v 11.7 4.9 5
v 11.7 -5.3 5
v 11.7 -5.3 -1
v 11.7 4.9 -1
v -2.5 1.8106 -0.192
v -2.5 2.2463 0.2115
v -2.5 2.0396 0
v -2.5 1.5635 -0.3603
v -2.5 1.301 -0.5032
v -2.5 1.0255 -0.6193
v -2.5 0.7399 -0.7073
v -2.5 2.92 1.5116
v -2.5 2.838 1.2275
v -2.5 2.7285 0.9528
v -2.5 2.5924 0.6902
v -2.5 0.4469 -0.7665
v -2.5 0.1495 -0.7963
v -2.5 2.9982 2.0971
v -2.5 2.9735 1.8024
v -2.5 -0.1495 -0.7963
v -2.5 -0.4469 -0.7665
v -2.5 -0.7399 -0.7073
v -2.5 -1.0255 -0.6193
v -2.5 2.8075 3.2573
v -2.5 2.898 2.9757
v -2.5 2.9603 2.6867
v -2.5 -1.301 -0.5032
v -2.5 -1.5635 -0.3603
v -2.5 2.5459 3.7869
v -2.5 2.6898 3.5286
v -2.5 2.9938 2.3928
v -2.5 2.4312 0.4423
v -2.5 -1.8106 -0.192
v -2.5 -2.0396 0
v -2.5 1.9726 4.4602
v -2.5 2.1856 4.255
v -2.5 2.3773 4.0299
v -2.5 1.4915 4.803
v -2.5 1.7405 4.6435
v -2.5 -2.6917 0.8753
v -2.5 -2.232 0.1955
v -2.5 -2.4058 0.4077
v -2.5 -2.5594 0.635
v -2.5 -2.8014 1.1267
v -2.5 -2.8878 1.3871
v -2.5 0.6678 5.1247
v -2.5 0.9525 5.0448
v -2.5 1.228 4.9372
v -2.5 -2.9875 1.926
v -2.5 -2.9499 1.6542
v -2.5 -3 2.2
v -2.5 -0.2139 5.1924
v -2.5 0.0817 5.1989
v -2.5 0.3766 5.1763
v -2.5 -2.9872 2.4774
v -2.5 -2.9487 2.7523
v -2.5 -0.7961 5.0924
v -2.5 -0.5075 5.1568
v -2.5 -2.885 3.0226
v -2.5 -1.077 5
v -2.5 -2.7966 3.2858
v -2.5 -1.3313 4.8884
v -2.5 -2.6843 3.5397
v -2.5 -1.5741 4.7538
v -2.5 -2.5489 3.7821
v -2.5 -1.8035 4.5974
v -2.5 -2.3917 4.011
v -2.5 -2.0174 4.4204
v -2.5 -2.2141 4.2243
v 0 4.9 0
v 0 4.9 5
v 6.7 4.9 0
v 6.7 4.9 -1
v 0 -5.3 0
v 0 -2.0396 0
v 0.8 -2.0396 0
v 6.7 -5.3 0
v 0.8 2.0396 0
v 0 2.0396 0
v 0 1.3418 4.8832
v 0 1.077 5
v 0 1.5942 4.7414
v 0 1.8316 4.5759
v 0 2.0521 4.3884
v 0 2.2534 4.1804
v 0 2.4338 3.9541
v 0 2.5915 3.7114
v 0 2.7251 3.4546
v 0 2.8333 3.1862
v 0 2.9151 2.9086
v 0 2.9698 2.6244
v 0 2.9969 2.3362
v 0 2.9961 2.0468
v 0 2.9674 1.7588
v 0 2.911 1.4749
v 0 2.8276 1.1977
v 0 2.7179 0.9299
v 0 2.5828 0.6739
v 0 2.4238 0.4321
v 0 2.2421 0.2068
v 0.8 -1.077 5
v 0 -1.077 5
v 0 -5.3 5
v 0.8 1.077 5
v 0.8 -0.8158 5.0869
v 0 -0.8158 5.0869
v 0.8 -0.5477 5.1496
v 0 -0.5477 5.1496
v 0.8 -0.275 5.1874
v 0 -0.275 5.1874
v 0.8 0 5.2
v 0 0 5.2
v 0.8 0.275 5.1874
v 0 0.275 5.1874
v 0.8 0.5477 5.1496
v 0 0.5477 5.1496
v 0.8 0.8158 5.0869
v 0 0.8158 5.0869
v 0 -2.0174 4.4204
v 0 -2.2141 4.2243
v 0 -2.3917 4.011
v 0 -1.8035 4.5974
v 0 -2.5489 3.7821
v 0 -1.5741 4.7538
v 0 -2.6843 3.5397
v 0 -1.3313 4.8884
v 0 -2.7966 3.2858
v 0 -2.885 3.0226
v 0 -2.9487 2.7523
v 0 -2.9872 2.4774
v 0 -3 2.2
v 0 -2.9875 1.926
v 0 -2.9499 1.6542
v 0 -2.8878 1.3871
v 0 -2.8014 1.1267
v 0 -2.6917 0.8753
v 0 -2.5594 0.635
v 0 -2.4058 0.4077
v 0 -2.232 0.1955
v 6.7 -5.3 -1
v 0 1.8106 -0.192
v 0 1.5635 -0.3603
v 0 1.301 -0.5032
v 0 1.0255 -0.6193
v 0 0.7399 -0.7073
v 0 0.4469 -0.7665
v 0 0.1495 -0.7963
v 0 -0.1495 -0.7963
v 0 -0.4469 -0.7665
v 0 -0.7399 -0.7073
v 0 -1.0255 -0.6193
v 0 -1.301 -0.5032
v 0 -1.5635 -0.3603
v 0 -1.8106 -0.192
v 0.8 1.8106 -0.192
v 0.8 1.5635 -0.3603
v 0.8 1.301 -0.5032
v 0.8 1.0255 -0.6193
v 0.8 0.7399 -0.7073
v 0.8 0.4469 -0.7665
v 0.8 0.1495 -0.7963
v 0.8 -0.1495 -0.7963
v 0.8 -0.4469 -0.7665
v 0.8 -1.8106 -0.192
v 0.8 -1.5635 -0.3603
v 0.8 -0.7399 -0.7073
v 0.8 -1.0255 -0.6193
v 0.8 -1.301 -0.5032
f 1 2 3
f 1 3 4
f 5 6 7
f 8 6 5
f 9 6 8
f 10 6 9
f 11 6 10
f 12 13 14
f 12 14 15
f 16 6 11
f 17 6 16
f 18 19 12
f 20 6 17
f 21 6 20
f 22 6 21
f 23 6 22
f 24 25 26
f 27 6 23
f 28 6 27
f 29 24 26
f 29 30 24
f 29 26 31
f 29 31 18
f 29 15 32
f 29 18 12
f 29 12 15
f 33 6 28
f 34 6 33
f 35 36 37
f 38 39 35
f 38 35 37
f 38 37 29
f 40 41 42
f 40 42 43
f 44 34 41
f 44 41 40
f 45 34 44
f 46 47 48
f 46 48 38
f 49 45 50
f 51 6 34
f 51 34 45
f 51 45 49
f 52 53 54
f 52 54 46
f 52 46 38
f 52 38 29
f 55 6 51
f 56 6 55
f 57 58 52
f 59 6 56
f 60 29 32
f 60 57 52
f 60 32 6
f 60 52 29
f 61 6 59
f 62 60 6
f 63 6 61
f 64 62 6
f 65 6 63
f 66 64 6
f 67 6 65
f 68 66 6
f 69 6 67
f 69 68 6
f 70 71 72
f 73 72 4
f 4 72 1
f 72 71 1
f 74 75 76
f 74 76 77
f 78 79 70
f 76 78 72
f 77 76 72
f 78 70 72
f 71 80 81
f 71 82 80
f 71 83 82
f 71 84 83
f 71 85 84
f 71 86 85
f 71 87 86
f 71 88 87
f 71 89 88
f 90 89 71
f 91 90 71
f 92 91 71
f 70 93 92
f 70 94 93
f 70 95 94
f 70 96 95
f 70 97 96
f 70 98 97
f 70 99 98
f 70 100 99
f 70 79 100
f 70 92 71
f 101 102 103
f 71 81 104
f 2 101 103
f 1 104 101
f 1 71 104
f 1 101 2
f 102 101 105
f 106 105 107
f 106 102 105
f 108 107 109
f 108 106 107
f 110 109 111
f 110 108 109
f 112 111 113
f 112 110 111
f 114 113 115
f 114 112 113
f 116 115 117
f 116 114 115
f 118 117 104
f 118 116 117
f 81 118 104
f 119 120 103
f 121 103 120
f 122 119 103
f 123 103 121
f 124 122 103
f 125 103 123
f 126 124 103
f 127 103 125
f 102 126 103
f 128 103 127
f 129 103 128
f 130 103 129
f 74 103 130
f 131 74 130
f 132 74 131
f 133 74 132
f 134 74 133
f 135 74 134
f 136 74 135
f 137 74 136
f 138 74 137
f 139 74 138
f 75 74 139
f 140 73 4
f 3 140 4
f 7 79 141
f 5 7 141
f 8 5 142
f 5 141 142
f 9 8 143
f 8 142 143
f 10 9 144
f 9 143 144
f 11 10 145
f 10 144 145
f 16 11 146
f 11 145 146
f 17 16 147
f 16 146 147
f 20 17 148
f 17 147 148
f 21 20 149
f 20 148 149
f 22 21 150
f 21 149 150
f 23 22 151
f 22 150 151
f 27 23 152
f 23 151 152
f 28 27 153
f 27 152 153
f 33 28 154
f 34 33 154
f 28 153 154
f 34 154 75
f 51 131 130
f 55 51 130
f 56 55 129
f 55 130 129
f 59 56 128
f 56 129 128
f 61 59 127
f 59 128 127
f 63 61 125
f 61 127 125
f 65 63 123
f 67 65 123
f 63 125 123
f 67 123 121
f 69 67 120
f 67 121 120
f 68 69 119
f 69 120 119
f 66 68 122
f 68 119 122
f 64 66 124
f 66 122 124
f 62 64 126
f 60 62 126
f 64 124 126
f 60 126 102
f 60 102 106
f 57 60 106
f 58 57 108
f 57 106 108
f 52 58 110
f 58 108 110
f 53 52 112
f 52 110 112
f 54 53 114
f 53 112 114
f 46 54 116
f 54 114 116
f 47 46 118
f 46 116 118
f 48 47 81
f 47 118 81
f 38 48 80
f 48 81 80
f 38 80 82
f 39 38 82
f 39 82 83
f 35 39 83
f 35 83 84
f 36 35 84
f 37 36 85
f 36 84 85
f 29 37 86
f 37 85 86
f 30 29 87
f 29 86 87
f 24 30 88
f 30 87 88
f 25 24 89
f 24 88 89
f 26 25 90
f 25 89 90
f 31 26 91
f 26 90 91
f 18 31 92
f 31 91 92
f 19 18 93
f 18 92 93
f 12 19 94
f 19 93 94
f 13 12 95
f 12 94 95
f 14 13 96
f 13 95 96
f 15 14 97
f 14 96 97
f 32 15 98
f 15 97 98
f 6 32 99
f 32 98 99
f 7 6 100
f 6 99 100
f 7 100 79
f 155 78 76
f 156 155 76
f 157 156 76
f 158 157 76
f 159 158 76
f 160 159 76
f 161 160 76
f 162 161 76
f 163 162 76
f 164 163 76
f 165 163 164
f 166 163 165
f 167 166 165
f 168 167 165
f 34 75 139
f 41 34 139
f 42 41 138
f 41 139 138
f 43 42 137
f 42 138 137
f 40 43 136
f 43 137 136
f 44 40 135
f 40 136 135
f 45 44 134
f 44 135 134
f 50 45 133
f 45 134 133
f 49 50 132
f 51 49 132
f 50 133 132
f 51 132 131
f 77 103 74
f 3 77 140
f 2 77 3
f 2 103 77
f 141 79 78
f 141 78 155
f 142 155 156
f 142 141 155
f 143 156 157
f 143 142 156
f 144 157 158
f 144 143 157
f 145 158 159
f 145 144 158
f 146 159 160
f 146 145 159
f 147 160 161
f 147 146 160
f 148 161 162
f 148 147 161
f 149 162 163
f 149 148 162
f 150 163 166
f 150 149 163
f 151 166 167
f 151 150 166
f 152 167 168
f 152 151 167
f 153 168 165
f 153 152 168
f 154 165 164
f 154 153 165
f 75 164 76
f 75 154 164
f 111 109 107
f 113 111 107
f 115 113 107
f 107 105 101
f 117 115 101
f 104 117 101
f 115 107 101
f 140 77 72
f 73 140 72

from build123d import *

# Parameters (mm, degrees)
F0_W          = 5
F0_H          = 10.2
F0_W_2        = 6.7
F1_DEPTH      = 5
F2_DEPTH      = 1
F4_DEPTH      = 2.5
F4_DEPTH_BACK = 0.8


with BuildPart() as f1:
    # F0 (on Top) → F1 (new body)
    with BuildSketch(Plane.XY):
        with Locations((9.2, -0.2)):
            Rectangle(F0_W, F0_H)
        with Locations((3.35, -0.2)):
            Rectangle(F0_W_2, F0_H)
    extrude(amount=F1_DEPTH)

    # F0 (on Top) → F2 (join)
    with BuildSketch(Plane.XY):
        with Locations((9.2, -0.2)):
            Rectangle(F0_W, F0_H)
    extrude(amount=-F2_DEPTH)

    # F3 (on face) → F4 (join, two sides)
    with BuildSketch(Plane(origin=(0, 0, 0), x_dir=(0, -1, 0), z_dir=(-1, 0, 0))) as f4_sk:
        with BuildLine():
            ThreePointArc((2.0396078054, 0), (2.7494384351, 0.9997549034), (3, 2.2))
            ThreePointArc((3, 2.2), (2.4729636961, 3.8983670268), (1.0770329614, 5))
            Line((1.0770329614, 5), (-1.0770329614, 5))
            ThreePointArc((-1.0770329614, 5), (-2.9459060435, 2.7671310101), (-2.0396078054, 0))
            Line((-2.0396078054, 0), (2.0396078054, 0))
        make_face()
        with BuildLine():
            Line((-1.0770329614, 5), (1.0770329614, 5))
            ThreePointArc((1.0770329614, 5), (0, 5.2), (-1.0770329614, 5))
        make_face()
        with BuildLine():
            ThreePointArc((-2.0396078054, 0), (0, -0.8), (2.0396078054, 0))
            Line((2.0396078054, 0), (-2.0396078054, 0))
        make_face()
    extrude(amount=F4_DEPTH)
    extrude(f4_sk.sketch, amount=-F4_DEPTH_BACK)


solid = f1.part
